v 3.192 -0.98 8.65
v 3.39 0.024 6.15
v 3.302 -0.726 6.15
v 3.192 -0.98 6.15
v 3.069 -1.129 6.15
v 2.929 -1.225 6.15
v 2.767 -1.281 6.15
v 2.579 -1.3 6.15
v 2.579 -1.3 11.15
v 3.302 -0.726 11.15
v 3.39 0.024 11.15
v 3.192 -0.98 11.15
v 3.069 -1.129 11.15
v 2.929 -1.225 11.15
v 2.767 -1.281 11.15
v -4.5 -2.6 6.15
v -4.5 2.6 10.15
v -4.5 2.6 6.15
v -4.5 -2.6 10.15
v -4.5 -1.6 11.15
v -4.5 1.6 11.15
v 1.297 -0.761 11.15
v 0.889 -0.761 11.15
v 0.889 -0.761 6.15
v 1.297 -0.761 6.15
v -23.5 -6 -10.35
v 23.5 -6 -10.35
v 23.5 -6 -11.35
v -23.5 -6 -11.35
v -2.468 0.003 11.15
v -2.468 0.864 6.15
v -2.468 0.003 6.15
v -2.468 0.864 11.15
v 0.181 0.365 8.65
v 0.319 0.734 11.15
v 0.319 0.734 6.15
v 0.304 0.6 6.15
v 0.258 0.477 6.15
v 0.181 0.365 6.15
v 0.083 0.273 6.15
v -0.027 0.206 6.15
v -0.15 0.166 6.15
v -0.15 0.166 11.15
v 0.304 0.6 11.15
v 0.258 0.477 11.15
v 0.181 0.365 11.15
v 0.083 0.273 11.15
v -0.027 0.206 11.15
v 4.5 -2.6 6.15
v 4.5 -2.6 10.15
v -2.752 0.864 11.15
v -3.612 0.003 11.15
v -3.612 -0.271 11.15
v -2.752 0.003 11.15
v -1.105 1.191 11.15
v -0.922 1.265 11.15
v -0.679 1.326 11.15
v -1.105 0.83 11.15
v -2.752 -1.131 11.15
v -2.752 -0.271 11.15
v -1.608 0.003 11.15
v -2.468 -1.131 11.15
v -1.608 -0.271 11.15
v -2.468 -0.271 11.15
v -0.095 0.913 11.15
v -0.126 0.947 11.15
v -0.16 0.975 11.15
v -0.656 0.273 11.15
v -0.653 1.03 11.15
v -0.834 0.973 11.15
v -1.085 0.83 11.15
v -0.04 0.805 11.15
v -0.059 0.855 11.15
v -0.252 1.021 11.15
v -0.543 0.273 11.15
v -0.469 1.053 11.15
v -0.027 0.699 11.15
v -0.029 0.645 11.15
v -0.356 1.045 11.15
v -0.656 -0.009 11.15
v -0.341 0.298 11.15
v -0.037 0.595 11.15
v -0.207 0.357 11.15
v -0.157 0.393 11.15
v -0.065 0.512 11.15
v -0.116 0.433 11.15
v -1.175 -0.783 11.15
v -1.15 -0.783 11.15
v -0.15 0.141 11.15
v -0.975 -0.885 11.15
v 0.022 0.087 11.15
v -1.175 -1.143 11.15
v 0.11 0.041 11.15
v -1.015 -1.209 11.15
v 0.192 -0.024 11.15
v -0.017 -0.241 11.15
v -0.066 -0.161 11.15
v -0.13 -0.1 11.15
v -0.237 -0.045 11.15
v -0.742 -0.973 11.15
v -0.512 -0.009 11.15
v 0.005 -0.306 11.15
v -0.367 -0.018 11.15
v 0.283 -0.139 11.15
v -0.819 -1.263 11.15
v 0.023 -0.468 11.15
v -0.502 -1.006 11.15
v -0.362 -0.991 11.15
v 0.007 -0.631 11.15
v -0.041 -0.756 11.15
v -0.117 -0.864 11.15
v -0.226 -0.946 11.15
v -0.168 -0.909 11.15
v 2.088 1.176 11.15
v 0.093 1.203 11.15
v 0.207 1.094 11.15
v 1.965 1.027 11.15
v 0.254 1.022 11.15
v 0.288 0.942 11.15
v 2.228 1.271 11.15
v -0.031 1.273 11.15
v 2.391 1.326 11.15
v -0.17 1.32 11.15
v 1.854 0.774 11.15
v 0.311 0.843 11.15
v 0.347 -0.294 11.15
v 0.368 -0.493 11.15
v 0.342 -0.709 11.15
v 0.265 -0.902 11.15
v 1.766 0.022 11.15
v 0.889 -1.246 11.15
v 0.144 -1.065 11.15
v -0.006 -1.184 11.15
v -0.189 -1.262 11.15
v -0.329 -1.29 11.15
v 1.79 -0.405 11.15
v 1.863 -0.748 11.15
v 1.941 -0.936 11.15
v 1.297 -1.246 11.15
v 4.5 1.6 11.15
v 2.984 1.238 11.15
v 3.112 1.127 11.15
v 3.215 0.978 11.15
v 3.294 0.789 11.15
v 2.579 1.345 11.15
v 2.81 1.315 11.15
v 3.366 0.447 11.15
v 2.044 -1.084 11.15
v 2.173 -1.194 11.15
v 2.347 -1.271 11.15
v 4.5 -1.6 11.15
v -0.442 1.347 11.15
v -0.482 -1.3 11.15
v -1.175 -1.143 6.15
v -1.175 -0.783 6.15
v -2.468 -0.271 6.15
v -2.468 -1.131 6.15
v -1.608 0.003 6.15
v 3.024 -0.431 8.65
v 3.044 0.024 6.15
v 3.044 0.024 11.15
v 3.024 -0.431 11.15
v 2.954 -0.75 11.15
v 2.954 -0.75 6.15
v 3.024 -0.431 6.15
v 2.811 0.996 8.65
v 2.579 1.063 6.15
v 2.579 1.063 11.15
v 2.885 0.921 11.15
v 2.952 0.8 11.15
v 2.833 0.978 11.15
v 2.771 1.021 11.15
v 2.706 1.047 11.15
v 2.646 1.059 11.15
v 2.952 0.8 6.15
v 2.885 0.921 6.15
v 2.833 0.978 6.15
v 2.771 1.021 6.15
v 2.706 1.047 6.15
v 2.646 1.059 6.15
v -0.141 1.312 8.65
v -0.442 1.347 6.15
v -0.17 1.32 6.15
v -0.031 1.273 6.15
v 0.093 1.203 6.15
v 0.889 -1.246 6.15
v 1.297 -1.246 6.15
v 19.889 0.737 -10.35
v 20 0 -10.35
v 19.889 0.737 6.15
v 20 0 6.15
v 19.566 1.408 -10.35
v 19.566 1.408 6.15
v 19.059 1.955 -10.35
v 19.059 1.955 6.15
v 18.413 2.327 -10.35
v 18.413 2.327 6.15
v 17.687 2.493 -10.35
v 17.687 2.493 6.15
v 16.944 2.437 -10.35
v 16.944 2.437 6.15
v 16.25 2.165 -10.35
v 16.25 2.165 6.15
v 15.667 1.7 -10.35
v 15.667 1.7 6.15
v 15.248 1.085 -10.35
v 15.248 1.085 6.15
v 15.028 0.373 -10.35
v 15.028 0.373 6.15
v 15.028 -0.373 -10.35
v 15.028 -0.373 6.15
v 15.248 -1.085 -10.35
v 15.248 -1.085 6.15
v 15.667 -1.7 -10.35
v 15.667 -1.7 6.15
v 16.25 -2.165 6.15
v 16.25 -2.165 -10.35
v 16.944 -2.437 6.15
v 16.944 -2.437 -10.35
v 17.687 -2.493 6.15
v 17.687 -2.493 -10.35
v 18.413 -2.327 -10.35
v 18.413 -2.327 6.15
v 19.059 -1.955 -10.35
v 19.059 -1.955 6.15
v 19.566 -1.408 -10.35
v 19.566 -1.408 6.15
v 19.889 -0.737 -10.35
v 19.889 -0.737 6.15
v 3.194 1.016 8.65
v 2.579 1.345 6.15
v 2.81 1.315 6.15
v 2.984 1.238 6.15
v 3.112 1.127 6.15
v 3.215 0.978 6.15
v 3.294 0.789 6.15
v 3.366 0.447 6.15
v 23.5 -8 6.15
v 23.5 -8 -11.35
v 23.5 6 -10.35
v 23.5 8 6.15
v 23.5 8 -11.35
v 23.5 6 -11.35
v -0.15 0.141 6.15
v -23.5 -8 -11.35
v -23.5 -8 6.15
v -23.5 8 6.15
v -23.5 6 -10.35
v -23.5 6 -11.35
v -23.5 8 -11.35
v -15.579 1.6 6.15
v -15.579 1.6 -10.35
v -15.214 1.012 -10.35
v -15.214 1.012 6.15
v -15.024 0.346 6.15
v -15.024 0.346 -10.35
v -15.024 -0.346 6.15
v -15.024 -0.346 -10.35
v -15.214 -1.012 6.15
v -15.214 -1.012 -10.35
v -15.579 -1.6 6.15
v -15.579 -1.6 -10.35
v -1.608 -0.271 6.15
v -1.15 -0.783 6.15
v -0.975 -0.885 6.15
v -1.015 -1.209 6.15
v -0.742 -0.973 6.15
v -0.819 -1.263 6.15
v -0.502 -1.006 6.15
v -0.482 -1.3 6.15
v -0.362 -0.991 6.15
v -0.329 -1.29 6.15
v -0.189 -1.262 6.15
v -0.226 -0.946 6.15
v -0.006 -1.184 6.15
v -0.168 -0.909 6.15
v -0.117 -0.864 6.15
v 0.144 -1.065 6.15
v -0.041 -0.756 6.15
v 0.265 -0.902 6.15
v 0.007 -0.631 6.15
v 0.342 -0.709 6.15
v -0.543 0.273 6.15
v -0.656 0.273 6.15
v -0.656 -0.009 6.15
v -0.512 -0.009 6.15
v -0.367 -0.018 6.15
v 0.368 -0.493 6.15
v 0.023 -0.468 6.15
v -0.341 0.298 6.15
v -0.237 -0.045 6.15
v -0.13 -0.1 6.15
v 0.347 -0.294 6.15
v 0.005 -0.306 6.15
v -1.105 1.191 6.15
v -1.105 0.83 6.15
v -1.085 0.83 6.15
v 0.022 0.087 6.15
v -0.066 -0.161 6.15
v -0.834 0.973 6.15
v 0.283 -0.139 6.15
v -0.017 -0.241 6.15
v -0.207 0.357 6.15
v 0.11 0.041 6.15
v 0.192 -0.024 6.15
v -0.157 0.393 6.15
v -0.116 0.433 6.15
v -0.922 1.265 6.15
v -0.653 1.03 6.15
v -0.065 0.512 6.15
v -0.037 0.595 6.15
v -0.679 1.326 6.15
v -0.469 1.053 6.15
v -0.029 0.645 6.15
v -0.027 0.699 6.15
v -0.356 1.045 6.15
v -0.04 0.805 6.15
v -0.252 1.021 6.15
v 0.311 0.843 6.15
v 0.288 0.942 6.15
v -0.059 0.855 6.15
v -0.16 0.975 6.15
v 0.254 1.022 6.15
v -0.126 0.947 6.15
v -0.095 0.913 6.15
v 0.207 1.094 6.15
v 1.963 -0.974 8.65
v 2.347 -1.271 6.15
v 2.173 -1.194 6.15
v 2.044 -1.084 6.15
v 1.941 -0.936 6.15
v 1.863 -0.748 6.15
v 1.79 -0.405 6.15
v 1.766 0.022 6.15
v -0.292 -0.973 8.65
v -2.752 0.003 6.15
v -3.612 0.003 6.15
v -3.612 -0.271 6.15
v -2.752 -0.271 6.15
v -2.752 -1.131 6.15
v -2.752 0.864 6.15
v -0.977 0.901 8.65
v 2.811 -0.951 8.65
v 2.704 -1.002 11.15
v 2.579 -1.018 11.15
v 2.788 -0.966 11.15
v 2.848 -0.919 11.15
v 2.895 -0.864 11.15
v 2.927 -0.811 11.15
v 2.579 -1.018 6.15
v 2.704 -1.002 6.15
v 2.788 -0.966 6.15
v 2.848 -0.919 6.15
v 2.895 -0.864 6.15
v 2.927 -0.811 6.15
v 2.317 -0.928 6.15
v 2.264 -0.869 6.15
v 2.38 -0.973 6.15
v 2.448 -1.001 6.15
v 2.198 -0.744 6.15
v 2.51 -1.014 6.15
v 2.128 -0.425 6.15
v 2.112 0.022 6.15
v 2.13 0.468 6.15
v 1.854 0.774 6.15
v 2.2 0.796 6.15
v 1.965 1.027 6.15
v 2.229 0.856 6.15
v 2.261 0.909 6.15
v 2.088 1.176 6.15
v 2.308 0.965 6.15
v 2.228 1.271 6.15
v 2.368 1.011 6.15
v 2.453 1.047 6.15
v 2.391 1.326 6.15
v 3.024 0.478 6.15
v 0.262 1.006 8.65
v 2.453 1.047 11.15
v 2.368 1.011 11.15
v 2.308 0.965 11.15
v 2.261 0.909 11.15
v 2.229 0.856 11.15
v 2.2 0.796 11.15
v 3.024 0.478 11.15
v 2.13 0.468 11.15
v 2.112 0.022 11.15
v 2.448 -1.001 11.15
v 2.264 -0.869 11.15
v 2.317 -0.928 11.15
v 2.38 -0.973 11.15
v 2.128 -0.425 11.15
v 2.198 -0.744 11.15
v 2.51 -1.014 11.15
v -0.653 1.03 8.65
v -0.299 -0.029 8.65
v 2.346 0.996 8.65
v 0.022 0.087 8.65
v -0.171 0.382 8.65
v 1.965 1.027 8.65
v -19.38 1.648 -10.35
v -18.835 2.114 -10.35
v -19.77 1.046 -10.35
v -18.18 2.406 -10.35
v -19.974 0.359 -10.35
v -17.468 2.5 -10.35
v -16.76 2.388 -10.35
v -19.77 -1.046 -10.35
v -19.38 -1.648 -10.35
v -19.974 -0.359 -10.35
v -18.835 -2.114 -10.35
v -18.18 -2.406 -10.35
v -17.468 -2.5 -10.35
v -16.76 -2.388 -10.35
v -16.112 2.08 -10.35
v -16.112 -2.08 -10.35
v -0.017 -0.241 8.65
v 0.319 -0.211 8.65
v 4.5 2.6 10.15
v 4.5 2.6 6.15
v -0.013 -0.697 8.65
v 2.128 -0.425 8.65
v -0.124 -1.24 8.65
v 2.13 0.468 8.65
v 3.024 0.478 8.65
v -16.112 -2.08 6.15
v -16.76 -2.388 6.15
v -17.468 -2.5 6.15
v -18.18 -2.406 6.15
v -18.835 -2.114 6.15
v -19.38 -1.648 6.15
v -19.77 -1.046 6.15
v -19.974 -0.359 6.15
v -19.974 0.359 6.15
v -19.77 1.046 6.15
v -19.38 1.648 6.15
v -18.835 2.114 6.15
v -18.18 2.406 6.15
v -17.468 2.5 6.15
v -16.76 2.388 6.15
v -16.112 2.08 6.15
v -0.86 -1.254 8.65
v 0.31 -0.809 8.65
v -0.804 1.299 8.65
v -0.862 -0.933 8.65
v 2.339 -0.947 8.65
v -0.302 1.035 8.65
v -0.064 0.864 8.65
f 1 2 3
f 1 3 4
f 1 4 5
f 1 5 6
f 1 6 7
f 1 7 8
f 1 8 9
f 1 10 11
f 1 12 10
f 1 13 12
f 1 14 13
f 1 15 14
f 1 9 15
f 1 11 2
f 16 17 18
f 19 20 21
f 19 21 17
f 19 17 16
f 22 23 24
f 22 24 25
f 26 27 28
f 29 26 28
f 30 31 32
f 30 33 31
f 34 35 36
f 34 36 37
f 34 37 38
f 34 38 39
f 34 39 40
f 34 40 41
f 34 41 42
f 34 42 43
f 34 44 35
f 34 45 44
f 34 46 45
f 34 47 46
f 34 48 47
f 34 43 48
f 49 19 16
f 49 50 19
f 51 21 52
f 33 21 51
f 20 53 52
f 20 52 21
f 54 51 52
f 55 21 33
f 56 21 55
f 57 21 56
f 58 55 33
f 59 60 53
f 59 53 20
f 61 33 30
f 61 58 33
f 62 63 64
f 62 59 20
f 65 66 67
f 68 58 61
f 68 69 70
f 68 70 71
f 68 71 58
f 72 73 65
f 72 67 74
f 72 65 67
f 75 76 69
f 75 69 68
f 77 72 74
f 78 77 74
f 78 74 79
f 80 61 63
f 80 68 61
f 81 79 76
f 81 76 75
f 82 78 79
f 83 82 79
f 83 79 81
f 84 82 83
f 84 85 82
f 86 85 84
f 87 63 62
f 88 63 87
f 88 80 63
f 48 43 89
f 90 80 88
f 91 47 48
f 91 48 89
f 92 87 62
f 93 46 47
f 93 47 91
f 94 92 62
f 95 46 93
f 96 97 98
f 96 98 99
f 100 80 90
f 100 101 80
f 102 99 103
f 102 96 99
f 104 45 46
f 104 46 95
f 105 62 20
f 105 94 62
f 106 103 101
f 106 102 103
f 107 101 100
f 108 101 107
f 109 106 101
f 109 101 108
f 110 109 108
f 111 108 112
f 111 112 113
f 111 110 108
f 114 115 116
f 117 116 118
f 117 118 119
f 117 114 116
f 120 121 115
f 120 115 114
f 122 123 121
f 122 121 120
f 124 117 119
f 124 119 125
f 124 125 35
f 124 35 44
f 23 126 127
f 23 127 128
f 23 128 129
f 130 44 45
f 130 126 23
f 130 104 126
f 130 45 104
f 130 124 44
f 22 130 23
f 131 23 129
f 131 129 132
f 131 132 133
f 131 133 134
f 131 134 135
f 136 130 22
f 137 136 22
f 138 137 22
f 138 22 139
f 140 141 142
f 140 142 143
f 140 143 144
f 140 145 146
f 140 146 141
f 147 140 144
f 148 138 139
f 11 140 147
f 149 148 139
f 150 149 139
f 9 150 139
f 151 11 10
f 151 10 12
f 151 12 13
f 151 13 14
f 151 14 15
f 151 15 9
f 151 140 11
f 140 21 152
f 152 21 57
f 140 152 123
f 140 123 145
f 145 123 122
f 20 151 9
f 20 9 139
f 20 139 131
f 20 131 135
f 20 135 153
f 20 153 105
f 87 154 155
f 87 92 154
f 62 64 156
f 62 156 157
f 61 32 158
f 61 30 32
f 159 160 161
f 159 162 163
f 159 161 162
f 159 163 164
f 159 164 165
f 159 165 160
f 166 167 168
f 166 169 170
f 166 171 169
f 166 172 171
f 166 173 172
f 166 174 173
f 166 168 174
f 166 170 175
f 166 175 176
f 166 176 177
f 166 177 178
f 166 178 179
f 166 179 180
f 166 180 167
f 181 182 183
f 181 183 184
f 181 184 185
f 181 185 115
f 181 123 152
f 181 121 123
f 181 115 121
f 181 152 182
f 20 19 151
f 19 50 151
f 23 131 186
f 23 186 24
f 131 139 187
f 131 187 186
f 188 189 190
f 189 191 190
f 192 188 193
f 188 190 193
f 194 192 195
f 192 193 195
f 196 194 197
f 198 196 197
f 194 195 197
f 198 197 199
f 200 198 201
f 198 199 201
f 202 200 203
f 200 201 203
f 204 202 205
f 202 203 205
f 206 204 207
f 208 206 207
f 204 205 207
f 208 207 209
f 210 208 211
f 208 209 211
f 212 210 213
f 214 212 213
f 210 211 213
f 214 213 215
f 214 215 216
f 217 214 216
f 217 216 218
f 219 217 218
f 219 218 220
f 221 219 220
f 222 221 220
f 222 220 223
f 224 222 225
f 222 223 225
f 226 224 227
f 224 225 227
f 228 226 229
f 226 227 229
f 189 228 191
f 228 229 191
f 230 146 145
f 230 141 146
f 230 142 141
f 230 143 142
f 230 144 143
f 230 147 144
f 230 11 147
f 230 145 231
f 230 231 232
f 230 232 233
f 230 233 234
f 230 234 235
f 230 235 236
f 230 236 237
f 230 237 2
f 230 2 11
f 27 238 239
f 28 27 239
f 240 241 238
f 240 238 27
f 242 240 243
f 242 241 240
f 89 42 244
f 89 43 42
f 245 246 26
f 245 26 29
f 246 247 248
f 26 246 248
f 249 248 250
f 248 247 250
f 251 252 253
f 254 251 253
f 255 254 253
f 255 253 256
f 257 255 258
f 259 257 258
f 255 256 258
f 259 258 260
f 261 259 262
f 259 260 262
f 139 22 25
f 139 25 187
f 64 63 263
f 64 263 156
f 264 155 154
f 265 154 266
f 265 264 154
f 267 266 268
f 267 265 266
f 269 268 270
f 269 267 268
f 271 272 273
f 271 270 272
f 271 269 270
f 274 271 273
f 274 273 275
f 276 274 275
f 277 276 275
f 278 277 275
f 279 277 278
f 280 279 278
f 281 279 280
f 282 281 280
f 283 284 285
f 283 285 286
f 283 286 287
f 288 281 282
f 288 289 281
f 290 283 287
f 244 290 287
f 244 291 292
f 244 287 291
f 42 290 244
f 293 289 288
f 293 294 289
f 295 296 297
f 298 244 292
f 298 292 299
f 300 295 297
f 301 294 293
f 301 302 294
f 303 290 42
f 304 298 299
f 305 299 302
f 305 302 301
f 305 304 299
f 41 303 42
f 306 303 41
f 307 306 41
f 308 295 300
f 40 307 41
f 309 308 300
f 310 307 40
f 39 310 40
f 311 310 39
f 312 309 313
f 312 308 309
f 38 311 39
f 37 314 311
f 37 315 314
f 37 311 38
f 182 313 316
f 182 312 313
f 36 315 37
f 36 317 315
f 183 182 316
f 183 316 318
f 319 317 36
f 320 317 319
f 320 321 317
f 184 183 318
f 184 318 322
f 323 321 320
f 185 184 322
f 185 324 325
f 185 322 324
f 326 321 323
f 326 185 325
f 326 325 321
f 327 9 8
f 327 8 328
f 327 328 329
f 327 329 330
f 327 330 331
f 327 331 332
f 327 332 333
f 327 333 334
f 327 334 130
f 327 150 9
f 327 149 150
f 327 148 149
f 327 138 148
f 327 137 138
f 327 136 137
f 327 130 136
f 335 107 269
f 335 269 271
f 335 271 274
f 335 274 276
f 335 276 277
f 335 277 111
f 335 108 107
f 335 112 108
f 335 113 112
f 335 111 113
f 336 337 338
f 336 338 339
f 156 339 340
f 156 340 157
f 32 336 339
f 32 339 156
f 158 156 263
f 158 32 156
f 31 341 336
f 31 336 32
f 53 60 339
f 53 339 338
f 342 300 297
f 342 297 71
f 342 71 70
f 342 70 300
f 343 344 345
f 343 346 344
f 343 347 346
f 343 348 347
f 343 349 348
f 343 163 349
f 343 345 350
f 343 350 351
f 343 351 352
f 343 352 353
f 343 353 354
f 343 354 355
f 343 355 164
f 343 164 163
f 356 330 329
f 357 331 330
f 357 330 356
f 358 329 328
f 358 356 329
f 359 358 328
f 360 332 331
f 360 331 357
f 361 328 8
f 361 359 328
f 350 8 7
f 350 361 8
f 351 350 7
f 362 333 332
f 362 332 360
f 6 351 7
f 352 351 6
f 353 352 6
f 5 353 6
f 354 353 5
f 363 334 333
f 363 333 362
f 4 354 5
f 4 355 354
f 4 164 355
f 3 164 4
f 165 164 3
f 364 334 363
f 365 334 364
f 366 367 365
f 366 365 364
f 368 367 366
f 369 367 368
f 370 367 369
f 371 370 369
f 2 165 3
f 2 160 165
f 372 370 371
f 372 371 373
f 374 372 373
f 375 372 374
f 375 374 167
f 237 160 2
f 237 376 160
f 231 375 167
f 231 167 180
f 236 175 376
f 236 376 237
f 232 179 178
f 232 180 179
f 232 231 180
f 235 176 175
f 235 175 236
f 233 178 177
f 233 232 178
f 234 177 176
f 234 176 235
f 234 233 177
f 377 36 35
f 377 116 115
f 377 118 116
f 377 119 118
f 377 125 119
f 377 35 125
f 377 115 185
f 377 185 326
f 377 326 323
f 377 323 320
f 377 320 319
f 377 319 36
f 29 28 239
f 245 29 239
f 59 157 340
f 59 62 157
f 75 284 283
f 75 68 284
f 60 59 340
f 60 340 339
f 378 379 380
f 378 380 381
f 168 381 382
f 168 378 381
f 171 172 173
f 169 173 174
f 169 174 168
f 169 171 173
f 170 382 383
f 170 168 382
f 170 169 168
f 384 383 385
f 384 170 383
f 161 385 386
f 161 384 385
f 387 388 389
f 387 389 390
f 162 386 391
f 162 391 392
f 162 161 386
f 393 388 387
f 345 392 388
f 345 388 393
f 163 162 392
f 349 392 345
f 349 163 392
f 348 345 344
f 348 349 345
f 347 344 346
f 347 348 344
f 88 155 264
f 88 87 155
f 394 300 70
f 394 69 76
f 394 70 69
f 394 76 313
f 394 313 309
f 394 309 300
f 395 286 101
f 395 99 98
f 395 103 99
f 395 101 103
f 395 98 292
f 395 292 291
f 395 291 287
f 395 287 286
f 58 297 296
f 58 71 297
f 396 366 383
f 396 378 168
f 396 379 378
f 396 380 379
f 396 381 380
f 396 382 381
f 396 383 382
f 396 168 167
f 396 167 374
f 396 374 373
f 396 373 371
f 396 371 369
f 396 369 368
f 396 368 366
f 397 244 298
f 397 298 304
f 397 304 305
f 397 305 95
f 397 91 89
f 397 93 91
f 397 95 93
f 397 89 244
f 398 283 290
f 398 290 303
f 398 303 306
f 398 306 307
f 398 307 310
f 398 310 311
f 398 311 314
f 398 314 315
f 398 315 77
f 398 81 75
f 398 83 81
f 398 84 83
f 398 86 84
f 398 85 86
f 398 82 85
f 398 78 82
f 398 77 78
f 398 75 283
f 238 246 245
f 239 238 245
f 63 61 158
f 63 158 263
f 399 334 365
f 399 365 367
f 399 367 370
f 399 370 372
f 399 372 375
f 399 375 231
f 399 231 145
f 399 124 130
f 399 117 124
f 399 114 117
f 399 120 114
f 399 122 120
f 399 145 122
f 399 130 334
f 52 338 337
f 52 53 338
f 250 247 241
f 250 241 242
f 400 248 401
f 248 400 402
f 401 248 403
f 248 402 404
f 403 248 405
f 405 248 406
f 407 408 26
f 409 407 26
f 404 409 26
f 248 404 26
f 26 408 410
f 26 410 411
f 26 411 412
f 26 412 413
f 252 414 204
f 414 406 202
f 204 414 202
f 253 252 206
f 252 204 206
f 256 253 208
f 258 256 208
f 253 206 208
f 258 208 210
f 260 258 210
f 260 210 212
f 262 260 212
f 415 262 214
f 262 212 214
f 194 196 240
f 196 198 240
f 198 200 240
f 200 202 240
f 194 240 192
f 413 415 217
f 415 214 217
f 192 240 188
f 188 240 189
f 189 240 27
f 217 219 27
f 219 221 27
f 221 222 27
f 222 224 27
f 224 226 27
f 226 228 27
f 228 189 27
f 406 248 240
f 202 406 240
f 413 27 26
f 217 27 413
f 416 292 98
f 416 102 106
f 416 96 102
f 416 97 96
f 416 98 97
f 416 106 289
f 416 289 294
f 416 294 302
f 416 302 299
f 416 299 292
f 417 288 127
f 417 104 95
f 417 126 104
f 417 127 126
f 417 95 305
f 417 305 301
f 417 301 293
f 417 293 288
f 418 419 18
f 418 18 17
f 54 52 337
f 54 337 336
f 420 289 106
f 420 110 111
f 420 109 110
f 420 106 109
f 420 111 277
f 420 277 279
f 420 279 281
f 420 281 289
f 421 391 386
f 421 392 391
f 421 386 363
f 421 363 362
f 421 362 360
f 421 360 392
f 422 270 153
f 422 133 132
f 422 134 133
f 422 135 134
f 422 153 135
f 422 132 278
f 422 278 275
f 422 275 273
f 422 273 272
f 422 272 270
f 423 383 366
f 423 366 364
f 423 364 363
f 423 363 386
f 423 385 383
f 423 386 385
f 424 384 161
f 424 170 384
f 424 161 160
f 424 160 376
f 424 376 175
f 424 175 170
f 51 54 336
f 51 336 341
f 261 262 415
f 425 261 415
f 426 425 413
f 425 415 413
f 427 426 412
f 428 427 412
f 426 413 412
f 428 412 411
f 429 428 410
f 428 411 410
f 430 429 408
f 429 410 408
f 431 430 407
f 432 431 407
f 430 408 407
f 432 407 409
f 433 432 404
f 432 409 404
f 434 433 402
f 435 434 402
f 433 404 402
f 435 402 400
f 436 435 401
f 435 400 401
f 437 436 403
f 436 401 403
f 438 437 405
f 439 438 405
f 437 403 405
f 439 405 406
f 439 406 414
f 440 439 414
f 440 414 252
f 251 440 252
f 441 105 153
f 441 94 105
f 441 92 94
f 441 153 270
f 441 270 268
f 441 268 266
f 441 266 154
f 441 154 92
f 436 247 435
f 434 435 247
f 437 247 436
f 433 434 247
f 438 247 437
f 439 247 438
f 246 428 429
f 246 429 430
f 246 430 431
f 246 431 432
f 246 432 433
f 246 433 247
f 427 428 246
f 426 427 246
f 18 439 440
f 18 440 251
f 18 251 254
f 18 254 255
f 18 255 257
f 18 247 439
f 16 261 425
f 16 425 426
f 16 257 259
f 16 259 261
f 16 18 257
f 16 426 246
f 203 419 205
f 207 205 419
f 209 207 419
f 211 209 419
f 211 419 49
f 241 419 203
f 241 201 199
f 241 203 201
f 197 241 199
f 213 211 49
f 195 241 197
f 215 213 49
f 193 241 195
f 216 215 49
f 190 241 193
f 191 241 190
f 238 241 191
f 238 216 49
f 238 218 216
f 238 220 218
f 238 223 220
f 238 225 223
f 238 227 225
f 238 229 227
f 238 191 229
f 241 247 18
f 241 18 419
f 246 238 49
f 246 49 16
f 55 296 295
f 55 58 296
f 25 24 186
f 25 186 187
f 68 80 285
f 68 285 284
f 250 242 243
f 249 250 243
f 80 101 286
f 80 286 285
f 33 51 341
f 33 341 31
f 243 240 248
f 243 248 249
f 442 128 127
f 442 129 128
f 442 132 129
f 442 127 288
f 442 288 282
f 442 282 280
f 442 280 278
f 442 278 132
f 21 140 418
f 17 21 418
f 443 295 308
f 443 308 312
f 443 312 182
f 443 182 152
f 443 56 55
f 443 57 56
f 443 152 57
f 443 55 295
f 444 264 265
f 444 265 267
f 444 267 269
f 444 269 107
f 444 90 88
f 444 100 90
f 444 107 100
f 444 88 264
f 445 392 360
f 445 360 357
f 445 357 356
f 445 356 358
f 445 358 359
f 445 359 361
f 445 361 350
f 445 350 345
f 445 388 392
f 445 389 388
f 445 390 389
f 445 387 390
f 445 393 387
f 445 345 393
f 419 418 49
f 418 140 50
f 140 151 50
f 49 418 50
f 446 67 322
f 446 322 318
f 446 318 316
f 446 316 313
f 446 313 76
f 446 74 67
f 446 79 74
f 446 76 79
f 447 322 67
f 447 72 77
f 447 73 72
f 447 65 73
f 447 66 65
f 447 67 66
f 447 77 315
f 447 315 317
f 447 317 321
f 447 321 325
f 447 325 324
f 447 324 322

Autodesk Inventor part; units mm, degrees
ref_plane "YZ Plane" through (0, 0, 0) normal (1, 0, 0) x (0, 1, 0)
ref_plane "XZ Plane" through (0, 0, 0) normal (0, 1, 0) x (-1, 0, 0)
ref_plane "XY Plane" through (0, 0, 0) normal (0, 0, 1) x (1, 0, 0)
ref_plane "작업 평면1" through (23.5, -8, -2) normal (1, 0, 0) x (0, 0, -1)
sketch "스케치1" plane through (23.5, -8, -2) normal (1, 0, 0) x (0, 0, -1)
  line L0 (0, 16) -> (-8.15, 16) projected
  line L1 (-8.15, 16) -> (-8.15, 10.6) projected
  line L2 (-8.15, 10.6) -> (-12.15, 10.6) projected
  line L3 (-13.15, 9.6) -> (-12.15, 10.6) projected
  line L4 (-13.15, 9.6) -> (-13.15, 6.4) projected
  line L5 (-12.15, 5.4) -> (-13.15, 6.4) projected
  line L6 (-12.15, 5.4) -> (-8.15, 5.4) projected
  line L7 (-8.15, 5.4) -> (-8.15, 0) projected
  line L8 (-8.15, 0) -> (0, 0) projected
  line L9 (0, 16) -> (9.35, 16)
  line L10 (9.35, 16) -> (9.35, 15)
  line L11 (0, 0) -> (9.35, 0)
  line L12 (9.35, 0) -> (9.35, 1)
  line L13 (0, 16) -> (-8.15, 16)
  line L14 (-8.15, 10.6) -> (-12.15, 10.6) projected
  line L15 (-8.15, 10.6) -> (-12.15, 10.6)
  line L16 (-12.15, 10.6) -> (-13.15, 9.6)
  line L17 (-13.15, 6.4) -> (-12.15, 5.4)
  line L18 (8.35, 14) -> (9.35, 14)
  line L19 (9.35, 14) -> (9.35, 15)
  line L20 (8.35, 2) -> (9.35, 2)
  line L21 (9.35, 2) -> (9.35, 1)
  line L22 (8.35, 14) -> (8.35, 2)
  point P0 (-2, 8)
  point P1 (4.35, 10.6)
  point P2 (4.35, 5.4)
  dimension "d1" = 9.35
  dimension "d13" = 9.35
sketch "스케치2" plane through (-23.5, 8, 6.15) normal (0, 0, 1) x (1, 0, 0)
  arc A0 (7.9209, -9.6) -> (7.9209, -6.4) centre (6, -8) ccw projected
  line L0 (39.0791, -9.6) -> (7.9209, -9.6) projected
  circle A1 centre (6, -8) radius 2.5
  circle A2 centre (41, -8) radius 2.5 projected
  circle A3 centre (41, -8) radius 2.5
  point P0 (23.5, -8)
  point P1 (7.9209, -6.4)
extrude "돌출1" add sketch "스케치1" against normal up to surface (47 mm away)
extrude "돌출2" cut sketch "스케치2" along normal mid plane 50
sketch "스케치3" plane through (-15.5791, 1.6, 11.15) normal (0, 0, 1) x (1, 0, 0)
  line L0 (15.5791, -14.4593) -> (15.5791, 15.5737)
  line L1 (-7.9209, 4.4) -> (-7.9209, -7.6) projected
  line L2 (-7.9209, 4.4) -> (11.0791, 4.4)
  line L3 (11.0791, 4.4) -> (11.0791, -7.6)
  line L4 (11.0791, -7.6) -> (-7.9209, -7.6)
  line L5 (-7.9209, -7.6) -> (-7.9209, 4.4)
  line L6 (39.0791, 4.4) -> (39.0791, -7.6)
  line L7 (39.0791, 4.4) -> (20.0791, 4.4)
  line L8 (20.0791, 4.4) -> (20.0791, -7.6)
  line L9 (20.0791, -7.6) -> (39.0791, -7.6)
  line L10 (39.0791, -7.6) -> (39.0791, 4.4)
  point P0 (15.5791, -1.6)
  dimension "d9" = 19
extrude "돌출3" cut sketch "스케치3" against normal up to surface (5 mm away)
sketch "스케치4" plane through (-4.5, 1.6, 11.15) normal (0, 0, 1) x (1, 0, 0)
  line L0 (0.6181, -0.2528) -> (7.2489, -0.2528) construction
  line L1 (7.2489, -0.2528) -> (7.2489, -2.6222) construction
  line L2 (7.2489, -2.6222) -> (0.6181, -2.6222) construction
  line L3 (0.6181, -2.6222) -> (0.6181, -0.2528) construction
  line L4 (2.8925, -1.8707) -> (2.0321, -1.8707)
  line L5 (2.0321, -1.8707) -> (2.0321, -2.7311)
  line L6 (2.0321, -2.7311) -> (1.7481, -2.7311)
  line L7 (1.7481, -2.7311) -> (1.7481, -1.8707)
  line L8 (1.7481, -1.8707) -> (0.8877, -1.8707)
  line L9 (0.8877, -1.8707) -> (0.8877, -1.5969)
  line L10 (0.8877, -1.5969) -> (1.7481, -1.5969)
  line L11 (1.7481, -1.5969) -> (1.7481, -0.7365)
  line L12 (1.7481, -0.7365) -> (2.0321, -0.7365)
  line L13 (2.0321, -0.7365) -> (2.0321, -1.5969)
  line L14 (2.0321, -1.5969) -> (2.8925, -1.5969)
  line L15 (2.8925, -1.5969) -> (2.8925, -1.8707)
  spline S0 degree 2 poles (4.0308, -0.5472) (3.9382, -0.5472) (3.755, -0.5925) (3.6665, -0.6274) knots 0 0 0 1 2 2 2
  spline S1 degree 2 poles (3.6665, -0.6274) (3.5841, -0.6624) (3.4627, -0.7365) (3.4154, -0.7695) knots 0 0 0 1 2 2 2
  line L16 (3.4154, -0.7695) -> (3.3948, -0.7695)
  line L17 (3.3948, -0.7695) -> (3.3948, -0.4093)
  spline S2 degree 2 poles (3.3948, -0.4093) (3.5059, -0.3496) (3.8867, -0.2528) (4.0576, -0.2528) knots 0 0 0 1 2 2 2
  spline S3 degree 2 poles (4.0576, -0.2528) (4.2305, -0.2528) (4.4878, -0.3228) (4.5927, -0.3969) knots 0 0 0 1 2 2 2
  spline S4 degree 2 poles (4.5927, -0.3969) (4.7039, -0.4772) (4.8191, -0.7098) (4.8191, -0.8662) knots 0 0 0 1 2 2 2
  spline S5 degree 2 poles (4.8191, -0.8662) (4.8191, -1.0762) (4.5433, -1.3932) (4.3498, -1.4343) knots 0 0 0 1 2 2 2
  line L18 (4.3498, -1.4343) -> (4.3498, -1.459)
  spline S6 degree 2 poles (4.3498, -1.459) (4.4301, -1.4755) (4.6133, -1.5496) (4.6915, -1.6237) knots 0 0 0 1 2 2 2
  spline S7 degree 2 poles (4.6915, -1.6237) (4.7697, -1.6957) (4.8685, -1.9263) (4.8685, -2.093) knots 0 0 0 1 2 2 2
  spline S8 degree 2 poles (4.8685, -2.093) (4.8685, -2.2638) (4.7512, -2.5541) (4.6442, -2.6652) knots 0 0 0 1 2 2 2
  spline S9 degree 2 poles (4.6442, -2.6652) (4.533, -2.7805) (4.2181, -2.8999) (4.0184, -2.8999) knots 0 0 0 1 2 2 2
  spline S10 degree 2 poles (4.0184, -2.8999) (3.827, -2.8999) (3.4524, -2.8072) (3.3248, -2.7434) knots 0 0 0 1 2 2 2
  line L19 (3.3248, -2.7434) -> (3.3248, -2.3832)
  line L20 (3.3248, -2.3832) -> (3.3495, -2.3832)
  spline S11 degree 2 poles (3.3495, -2.3832) (3.4565, -2.4614) (3.8188, -2.6055) (3.9979, -2.6055) knots 0 0 0 1 2 2 2
  spline S12 degree 2 poles (3.9979, -2.6055) (4.1028, -2.6055) (4.3128, -2.5396) (4.3828, -2.4635) knots 0 0 0 1 2 2 2
  spline S13 degree 2 poles (4.3828, -2.4635) (4.4507, -2.3873) (4.5227, -2.2062) (4.5227, -2.0683) knots 0 0 0 1 2 2 2
  spline S14 degree 2 poles (4.5227, -2.0683) (4.5227, -1.9304) (4.4425, -1.7513) (4.3704, -1.6998) knots 0 0 0 1 2 2 2
  spline S15 degree 2 poles (4.3704, -1.6998) (4.2984, -1.6484) (4.1028, -1.6093) (3.9876, -1.6093) knots 0 0 0 1 2 2 2
  line L21 (3.9876, -1.6093) -> (3.8435, -1.6093)
  line L22 (3.8435, -1.6093) -> (3.8435, -1.3273)
  line L23 (3.8435, -1.3273) -> (3.9567, -1.3273)
  spline S16 degree 2 poles (3.9567, -1.3273) (4.1852, -1.3273) (4.4733, -1.1091) (4.4733, -0.9012) knots 0 0 0 1 2 2 2
  spline S17 degree 2 poles (4.4733, -0.9012) (4.4733, -0.8045) (4.3992, -0.6666) (4.3396, -0.6254) knots 0 0 0 1 2 2 2
  spline S18 degree 2 poles (4.3396, -0.6254) (4.2757, -0.5822) (4.1193, -0.5472) (4.0308, -0.5472) knots 0 0 0 1 2 2 2
  line L24 (5.7969, -2.8463) -> (5.3893, -2.8463)
  line L25 (5.3893, -2.8463) -> (5.3893, -2.3606)
  line L26 (5.3893, -2.3606) -> (5.7969, -2.3606)
  line L27 (5.7969, -2.3606) -> (5.7969, -2.8463)
  spline S19 degree 2 poles (7.8902, -1.5763) (7.8902, -2.2597) (7.4929, -2.8999) (7.0792, -2.8999) knots 0 0 0 1 2 2 2
  spline S20 degree 2 poles (7.0792, -2.8999) (6.6593, -2.8999) (6.2662, -2.2474) (6.2662, -1.5784) knots 0 0 0 1 2 2 2
  spline S21 degree 2 poles (6.2662, -1.5784) (6.2662, -0.8909) (6.6634, -0.2549) (7.0792, -0.2549) knots 0 0 0 1 2 2 2
  spline S22 degree 2 poles (7.0792, -0.2549) (7.4971, -0.2549) (7.8902, -0.9136) (7.8902, -1.5763) knots 0 0 0 1 2 2 2
  spline S23 degree 2 poles (7.4538, -2.3503) (7.5032, -2.2247) (7.5444, -1.8378) (7.5444, -1.5763) knots 0 0 0 1 2 2 2
  spline S24 degree 2 poles (7.5444, -1.5763) (7.5444, -1.3149) (7.5032, -0.93) (7.4518, -0.8003) knots 0 0 0 1 2 2 2
  spline S25 degree 2 poles (7.4518, -0.8003) (7.4003, -0.6707) (7.2212, -0.5369) (7.0792, -0.5369) knots 0 0 0 1 2 2 2
  spline S26 degree 2 poles (7.0792, -0.5369) (6.9372, -0.5369) (6.754, -0.6707) (6.7005, -0.8045) knots 0 0 0 1 2 2 2
  spline S27 degree 2 poles (6.7005, -0.8045) (6.649, -0.9341) (6.612, -1.3293) (6.612, -1.5784) knots 0 0 0 1 2 2 2
  spline S28 degree 2 poles (6.612, -1.5784) (6.612, -1.846) (6.6449, -2.2041) (6.6984, -2.3441) knots 0 0 0 1 2 2 2
  spline S29 degree 2 poles (6.6984, -2.3441) (6.7478, -2.4758) (6.931, -2.6179) (7.0792, -2.6179) knots 0 0 0 1 2 2 2
  spline S30 degree 2 poles (7.0792, -2.6179) (7.2192, -2.6179) (7.4024, -2.4841) (7.4538, -2.3503) knots 0 0 0 1 2 2 2
  point P0 (4.5, -1.6)
extrude "돌출4" cut sketch "스케치4" against normal blind 5
properties part number "Bearing Spacer_V2_3mm"
